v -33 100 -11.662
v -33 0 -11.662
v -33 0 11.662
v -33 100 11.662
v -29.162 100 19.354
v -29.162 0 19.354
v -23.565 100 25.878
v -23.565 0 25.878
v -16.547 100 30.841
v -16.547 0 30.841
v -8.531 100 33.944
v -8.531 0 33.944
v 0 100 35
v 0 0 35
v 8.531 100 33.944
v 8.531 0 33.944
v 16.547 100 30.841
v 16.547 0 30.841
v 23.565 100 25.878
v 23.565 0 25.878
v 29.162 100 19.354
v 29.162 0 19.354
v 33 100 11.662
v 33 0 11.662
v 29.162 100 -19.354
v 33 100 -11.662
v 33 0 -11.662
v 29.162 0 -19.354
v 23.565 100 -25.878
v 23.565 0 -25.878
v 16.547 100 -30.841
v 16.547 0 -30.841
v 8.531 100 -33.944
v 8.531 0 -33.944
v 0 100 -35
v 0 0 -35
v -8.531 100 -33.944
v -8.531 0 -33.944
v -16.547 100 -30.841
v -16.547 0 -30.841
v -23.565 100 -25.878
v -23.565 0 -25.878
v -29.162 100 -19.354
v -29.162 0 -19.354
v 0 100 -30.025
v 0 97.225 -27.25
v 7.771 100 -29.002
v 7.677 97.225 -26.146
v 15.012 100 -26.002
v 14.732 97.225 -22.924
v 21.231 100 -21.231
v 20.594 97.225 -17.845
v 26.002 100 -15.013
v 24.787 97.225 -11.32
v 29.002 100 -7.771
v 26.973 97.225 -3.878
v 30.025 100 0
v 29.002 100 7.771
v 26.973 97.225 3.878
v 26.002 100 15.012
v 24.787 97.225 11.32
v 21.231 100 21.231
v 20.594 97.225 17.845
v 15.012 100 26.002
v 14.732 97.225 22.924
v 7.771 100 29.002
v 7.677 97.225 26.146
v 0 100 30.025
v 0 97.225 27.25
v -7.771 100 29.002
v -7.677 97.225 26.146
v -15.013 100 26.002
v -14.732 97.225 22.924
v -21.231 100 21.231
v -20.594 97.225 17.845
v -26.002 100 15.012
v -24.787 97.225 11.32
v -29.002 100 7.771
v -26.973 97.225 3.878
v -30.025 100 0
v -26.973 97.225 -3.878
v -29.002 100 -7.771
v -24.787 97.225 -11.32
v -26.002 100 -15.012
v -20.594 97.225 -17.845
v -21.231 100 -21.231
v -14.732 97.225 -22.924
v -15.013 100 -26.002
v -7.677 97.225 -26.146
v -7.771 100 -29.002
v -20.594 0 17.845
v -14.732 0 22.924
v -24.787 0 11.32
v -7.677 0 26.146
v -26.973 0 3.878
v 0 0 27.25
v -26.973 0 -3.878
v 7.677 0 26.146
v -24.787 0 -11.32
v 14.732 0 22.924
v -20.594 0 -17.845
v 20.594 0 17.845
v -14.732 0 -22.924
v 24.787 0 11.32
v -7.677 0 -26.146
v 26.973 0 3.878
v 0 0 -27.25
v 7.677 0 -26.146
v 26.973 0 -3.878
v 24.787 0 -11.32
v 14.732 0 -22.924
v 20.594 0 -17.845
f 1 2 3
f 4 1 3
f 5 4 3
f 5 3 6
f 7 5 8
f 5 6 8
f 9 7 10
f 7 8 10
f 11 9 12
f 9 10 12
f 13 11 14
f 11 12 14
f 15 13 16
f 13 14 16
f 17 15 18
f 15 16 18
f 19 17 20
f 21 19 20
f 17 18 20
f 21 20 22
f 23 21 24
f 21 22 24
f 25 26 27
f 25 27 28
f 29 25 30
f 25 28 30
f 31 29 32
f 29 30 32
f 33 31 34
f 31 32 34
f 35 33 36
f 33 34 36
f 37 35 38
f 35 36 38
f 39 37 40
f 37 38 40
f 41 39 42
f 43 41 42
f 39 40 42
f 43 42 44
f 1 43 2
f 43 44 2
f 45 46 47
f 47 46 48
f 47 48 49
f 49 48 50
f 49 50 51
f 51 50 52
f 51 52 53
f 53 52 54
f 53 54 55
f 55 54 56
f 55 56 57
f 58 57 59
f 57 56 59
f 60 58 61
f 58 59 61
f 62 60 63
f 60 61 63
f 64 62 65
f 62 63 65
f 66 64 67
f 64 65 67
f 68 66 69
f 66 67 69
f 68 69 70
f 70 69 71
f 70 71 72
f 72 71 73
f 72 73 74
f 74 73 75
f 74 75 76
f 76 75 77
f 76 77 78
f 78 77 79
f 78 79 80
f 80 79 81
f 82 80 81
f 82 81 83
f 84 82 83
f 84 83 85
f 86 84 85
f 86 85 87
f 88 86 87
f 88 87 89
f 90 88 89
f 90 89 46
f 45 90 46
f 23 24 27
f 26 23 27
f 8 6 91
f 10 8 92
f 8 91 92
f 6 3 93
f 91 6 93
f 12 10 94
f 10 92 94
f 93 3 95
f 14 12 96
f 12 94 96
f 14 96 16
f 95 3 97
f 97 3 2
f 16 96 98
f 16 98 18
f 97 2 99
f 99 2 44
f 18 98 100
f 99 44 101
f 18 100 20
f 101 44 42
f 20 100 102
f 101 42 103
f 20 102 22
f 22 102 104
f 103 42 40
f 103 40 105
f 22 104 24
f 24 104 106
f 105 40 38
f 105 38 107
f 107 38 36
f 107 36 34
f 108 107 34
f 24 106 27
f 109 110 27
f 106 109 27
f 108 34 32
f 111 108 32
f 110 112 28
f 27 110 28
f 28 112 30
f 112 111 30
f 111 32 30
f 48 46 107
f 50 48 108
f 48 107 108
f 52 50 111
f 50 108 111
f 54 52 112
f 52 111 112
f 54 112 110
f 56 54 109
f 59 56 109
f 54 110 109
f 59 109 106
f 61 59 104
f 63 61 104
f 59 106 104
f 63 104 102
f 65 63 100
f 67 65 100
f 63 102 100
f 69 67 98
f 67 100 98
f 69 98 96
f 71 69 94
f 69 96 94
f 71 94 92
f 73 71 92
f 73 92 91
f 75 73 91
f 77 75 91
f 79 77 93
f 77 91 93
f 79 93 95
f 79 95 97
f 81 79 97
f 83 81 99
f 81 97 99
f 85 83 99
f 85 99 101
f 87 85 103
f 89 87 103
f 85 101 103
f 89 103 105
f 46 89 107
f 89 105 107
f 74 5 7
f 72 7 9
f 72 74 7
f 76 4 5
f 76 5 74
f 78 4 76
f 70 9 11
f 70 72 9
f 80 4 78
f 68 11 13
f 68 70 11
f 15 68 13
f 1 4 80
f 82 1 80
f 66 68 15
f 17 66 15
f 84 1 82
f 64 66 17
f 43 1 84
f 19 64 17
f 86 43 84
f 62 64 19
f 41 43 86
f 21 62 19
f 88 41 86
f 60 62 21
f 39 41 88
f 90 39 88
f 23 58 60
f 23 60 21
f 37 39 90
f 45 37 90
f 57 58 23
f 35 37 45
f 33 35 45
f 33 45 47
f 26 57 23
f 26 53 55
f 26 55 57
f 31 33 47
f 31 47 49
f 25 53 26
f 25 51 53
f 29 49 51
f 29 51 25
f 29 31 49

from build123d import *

# Parameters (mm, degrees)
EXTRUDE_2_DEPTH               = 100
HOLE_WIZARD_M60_2_D           = 54.5
HOLE_WIZARD_M60_2_CSINK_D     = 60.05
HOLE_WIZARD_M60_2_CSINK_ANGLE = 90


with BuildPart() as part:
    # 草图1 → 凸台-拉伸2 (new body)
    with BuildSketch(Plane(origin=(0, 0, 0), x_dir=(1, 0, 0), z_dir=(0, 1, 0))):
        with BuildLine():
            ThreePointArc((33, 11.66190379), (0, 35), (-33, 11.66190379))
            Line((-33, 11.66190379), (-33, -11.66190379))
            ThreePointArc((-33, -11.66190379), (0, -35), (33, -11.66190379))
            Line((33, -11.66190379), (33, 11.66190379))
        make_face()
    extrude(amount=EXTRUDE_2_DEPTH)

    # M60 螺纹孔2 (through all)
    with Locations(Plane.ZX.offset(100)):
        with Locations((0, 0)):
            CounterSinkHole(HOLE_WIZARD_M60_2_D / 2, HOLE_WIZARD_M60_2_CSINK_D / 2, counter_sink_angle=HOLE_WIZARD_M60_2_CSINK_ANGLE)


solid = part.part
